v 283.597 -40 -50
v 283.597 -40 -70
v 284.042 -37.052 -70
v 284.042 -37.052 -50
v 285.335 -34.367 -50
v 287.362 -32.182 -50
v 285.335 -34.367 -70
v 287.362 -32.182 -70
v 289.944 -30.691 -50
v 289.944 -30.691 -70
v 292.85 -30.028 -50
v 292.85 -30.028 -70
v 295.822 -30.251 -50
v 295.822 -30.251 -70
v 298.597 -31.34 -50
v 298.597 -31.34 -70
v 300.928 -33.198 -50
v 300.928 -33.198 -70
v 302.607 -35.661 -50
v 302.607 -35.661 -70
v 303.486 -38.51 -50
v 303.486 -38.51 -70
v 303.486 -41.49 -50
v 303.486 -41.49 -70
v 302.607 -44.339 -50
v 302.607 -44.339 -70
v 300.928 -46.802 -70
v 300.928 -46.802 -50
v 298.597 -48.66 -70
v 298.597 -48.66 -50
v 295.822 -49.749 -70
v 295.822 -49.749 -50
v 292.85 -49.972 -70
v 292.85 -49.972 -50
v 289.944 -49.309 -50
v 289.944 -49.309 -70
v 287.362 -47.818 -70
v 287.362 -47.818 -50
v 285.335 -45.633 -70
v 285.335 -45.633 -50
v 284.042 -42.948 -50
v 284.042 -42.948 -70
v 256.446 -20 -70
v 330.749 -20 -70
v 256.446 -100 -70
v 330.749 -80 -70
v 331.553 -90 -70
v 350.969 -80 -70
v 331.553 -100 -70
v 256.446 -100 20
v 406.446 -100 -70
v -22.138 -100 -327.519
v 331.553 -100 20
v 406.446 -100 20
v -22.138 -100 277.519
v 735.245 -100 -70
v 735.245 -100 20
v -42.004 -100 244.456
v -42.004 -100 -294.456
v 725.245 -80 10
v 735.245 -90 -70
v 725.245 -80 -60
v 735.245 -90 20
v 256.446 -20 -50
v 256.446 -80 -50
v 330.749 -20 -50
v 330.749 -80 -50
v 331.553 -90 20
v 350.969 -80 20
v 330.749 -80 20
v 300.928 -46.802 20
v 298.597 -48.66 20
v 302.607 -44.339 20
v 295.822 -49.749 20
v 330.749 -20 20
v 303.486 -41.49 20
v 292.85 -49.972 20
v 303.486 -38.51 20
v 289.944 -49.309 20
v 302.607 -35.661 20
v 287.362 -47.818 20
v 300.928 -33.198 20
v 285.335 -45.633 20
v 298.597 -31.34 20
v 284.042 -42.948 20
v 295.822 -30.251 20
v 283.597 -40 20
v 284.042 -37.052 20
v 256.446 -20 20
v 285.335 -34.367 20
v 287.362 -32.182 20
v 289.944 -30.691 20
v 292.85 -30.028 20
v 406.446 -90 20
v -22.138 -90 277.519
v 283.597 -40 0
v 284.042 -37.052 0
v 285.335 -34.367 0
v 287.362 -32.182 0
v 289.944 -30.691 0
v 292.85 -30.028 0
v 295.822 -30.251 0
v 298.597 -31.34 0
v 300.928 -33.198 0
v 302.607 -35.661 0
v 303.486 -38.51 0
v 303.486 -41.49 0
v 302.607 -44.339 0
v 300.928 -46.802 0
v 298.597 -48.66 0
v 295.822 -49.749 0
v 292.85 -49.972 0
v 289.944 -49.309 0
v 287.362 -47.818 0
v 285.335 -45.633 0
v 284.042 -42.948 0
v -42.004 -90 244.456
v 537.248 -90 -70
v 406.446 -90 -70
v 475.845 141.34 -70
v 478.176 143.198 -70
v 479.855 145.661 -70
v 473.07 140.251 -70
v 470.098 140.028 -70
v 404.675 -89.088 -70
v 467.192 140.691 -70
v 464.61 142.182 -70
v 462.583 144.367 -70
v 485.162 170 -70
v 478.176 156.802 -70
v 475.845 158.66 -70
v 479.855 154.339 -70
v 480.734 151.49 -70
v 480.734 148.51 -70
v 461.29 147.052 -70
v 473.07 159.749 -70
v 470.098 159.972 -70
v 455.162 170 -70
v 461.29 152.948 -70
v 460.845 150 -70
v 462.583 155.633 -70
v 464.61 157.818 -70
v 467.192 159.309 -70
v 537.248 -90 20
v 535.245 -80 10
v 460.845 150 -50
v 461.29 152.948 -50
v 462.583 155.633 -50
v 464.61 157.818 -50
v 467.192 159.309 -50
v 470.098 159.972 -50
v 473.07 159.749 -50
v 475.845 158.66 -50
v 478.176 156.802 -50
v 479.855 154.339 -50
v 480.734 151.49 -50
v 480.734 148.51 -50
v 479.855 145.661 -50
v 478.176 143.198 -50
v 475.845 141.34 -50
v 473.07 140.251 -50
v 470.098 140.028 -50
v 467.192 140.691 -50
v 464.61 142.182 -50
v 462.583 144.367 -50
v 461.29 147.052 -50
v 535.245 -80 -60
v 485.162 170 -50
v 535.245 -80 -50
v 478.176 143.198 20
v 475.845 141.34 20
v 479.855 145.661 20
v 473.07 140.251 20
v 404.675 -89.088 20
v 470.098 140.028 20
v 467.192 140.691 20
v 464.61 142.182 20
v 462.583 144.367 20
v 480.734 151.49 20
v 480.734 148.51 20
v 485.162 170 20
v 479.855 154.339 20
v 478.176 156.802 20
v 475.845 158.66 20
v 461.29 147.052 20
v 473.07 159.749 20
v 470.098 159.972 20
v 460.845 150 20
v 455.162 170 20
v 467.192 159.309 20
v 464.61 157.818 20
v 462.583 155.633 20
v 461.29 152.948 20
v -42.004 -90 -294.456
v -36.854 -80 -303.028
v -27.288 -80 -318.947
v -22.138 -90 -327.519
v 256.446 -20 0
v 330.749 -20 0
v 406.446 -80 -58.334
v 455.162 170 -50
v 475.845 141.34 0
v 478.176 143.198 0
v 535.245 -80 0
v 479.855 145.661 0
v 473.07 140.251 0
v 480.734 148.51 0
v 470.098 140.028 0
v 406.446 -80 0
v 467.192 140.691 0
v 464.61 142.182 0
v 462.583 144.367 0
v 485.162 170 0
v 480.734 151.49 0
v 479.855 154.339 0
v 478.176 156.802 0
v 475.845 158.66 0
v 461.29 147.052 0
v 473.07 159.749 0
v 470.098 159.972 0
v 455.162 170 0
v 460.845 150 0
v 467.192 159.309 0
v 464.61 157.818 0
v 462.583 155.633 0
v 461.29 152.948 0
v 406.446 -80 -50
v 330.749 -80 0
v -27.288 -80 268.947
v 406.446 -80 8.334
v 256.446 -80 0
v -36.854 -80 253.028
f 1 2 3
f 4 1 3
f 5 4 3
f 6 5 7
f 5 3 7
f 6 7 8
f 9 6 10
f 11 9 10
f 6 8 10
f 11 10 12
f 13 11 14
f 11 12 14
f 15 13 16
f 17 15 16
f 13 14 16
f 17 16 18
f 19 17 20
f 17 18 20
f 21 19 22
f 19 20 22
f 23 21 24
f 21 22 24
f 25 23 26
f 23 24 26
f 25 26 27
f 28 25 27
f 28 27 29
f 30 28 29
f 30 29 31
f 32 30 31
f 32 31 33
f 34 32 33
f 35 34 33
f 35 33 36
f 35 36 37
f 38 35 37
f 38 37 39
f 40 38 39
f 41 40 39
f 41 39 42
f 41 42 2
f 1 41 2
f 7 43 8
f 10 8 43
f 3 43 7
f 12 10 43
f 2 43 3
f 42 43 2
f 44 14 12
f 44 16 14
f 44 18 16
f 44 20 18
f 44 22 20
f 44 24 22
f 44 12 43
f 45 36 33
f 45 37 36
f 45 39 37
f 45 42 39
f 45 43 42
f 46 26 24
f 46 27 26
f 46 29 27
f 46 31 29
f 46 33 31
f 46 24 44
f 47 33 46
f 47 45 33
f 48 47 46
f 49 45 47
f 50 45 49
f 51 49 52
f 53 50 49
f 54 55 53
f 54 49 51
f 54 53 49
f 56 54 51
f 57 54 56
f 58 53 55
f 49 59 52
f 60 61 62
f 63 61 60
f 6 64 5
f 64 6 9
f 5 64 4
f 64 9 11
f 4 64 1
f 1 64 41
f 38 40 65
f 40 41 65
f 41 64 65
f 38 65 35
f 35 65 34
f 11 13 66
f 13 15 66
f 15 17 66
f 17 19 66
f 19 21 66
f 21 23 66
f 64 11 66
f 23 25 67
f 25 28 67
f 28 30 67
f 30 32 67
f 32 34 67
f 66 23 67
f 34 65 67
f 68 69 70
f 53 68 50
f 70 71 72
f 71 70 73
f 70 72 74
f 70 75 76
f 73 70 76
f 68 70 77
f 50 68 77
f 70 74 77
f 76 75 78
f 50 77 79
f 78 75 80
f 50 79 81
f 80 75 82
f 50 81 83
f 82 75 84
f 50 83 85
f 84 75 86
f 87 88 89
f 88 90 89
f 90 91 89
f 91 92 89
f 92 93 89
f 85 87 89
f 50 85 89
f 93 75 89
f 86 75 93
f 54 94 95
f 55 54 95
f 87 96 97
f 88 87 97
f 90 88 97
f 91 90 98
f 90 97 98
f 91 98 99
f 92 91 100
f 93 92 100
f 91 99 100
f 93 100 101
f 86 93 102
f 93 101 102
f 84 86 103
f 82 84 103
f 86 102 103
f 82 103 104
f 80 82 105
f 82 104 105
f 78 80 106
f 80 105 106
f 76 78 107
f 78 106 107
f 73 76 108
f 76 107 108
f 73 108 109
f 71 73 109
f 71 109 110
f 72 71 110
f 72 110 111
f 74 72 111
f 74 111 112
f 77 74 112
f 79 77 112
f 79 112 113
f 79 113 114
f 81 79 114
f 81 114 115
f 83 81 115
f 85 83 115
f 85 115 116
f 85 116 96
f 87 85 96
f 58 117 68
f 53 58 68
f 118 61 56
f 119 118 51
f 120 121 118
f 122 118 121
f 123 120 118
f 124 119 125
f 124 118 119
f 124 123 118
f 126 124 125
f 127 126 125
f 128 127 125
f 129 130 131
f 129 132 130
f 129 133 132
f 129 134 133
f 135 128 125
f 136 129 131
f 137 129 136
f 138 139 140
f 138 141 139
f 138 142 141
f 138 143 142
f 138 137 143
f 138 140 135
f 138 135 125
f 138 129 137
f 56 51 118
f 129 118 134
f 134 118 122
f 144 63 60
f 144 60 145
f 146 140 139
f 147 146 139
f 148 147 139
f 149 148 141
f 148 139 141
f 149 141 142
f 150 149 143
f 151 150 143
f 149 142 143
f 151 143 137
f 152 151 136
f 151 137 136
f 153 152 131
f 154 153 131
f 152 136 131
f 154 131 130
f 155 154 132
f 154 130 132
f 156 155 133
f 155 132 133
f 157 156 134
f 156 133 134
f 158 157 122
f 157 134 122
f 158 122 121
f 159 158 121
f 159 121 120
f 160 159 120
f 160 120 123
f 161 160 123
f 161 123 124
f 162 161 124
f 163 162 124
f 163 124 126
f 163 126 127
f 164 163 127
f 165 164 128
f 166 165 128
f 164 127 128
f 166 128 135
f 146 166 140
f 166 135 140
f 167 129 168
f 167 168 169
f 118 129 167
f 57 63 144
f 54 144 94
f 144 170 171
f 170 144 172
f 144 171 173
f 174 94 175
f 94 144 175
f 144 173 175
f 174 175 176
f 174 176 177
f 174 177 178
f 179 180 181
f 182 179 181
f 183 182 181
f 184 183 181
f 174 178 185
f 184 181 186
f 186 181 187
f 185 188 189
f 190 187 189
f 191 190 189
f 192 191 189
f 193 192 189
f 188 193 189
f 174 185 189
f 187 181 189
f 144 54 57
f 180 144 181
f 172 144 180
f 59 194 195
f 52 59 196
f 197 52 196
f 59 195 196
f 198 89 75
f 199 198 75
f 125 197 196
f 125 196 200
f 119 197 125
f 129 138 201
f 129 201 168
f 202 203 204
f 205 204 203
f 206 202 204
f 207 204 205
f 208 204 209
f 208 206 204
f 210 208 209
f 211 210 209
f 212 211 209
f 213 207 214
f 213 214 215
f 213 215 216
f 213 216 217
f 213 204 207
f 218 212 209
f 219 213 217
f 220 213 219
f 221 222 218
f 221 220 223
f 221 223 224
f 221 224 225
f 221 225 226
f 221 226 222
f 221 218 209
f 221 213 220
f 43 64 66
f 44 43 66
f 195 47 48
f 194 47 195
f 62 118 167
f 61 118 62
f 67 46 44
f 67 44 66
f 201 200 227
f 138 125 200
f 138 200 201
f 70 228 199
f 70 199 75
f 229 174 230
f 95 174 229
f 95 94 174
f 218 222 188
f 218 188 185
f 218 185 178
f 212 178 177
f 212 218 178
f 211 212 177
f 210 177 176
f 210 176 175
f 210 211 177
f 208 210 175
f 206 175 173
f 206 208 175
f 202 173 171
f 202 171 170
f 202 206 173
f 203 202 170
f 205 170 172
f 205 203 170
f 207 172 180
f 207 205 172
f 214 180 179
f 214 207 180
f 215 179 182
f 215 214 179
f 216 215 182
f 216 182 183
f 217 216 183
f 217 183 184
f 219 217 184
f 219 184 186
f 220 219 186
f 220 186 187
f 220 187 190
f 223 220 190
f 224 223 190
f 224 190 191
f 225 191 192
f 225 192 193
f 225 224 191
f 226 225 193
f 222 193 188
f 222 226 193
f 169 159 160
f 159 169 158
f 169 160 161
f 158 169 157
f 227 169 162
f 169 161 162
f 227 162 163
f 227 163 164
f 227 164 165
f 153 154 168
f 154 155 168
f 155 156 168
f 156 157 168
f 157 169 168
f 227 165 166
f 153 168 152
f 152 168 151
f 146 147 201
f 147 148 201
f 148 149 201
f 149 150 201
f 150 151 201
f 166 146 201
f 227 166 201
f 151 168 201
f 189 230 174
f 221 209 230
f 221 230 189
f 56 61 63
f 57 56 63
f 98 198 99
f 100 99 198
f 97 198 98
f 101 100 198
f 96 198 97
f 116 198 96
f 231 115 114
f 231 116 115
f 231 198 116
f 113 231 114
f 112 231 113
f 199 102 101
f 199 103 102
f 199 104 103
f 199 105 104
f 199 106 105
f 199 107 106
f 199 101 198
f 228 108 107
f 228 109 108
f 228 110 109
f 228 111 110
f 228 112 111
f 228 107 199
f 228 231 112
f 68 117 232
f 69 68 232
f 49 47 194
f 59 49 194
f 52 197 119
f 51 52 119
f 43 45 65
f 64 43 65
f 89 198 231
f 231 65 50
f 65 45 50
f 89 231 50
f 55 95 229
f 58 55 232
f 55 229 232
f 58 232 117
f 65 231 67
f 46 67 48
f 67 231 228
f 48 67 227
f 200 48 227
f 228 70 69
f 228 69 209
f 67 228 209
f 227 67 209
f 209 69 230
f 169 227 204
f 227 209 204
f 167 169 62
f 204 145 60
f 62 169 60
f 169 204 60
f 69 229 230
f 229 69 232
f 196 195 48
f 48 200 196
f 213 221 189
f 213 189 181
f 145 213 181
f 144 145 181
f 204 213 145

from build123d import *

# Parameters (mm, degrees)
ESQUISSE1_R             = 10
BOSS_EXTRU_1_DEPTH      = 20
BOSS_EXTRU_2_DEPTH      = 20
ESQUISSE3_R             = 10
BOSS_EXTRU_3_DEPTH      = 20
CHANFREIN3_SIZE         = 10
ESQUISSE2_5_W           = 74.303027804
ESQUISSE2_5_H           = 20
BOSS_EXTRU_4_DEPTH      = 60
ESQUISSE4_R             = 10
ENL_V_MAT_EXTRU_1_DEPTH = 831.815461604
CHANFREIN2_SIZE         = 10


with BuildPart() as part:
    # Esquisse1 → Boss.-Extru.1 (new body)
    with BuildSketch(Plane.XY):
        Polygon((455.162466111, 170), (485.162466111, 170), (535.244755063, -80), (406.445725989, -80), align=None)
        with Locations((470.845240526, 150)):
            Circle(ESQUISSE1_R, mode=Mode.SUBTRACT)
    extrude(amount=BOSS_EXTRU_1_DEPTH)

    # Esquisse2 → Boss.-Extru.2 (add)
    with BuildSketch(Plane.XZ.offset(80)):
        Polygon((735.244755063, 20), (406.445725989, 20), (-22.137924362, 277.519037455), (-42.004245202, 244.455927292), (331.553149283, 20), (256.445725989, 20), (256.445725989, -70), (331.553149283, -70), (-42.004245202, -294.455927292), (-22.137924362, -327.519037455), (406.445725989, -70), (735.244755063, -70), align=None)
    extrude(amount=BOSS_EXTRU_2_DEPTH)

    # Esquisse3 → Boss.-Extru.3 (add)
    with BuildSketch(Plane(origin=(0, 0, -70), x_dir=(-1, 0, 0), z_dir=(0, 0, -1))):
        Polygon((-406.445725989, -80), (-455.162466111, 170), (-485.162466111, 170), (-535.244755063, -80), align=None)
        with Locations((-470.845240526, 150)):
            Circle(ESQUISSE3_R, mode=Mode.SUBTRACT)
    extrude(amount=-BOSS_EXTRU_3_DEPTH)

    # Chanfrein3
    chanfrein3_edges = [part.edges().sort_by_distance(p)[0] for p in [
        (144.774452041, -80, 132.227963646),
        (144.774452041, -80, -182.227963646),
        (192.153900813, -80, 148.759518728),
        (192.153900813, -80, -198.759518728),
    ]]
    chamfer(chanfrein3_edges, length=CHANFREIN3_SIZE)

    # Esquisse2<5> → Boss.-Extru.4 (add)
    with BuildSketch(Plane.XZ.offset(80)):
        with Locations((293.597239891, 10)):
            Rectangle(ESQUISSE2_5_W, ESQUISSE2_5_H)
        with Locations((293.597239891, -60)):
            Rectangle(ESQUISSE2_5_W, ESQUISSE2_5_H)
    extrude(amount=-BOSS_EXTRU_4_DEPTH)

    # Esquisse4 → Enlèv. mat.-Extru.1 (cut, through all)
    with BuildSketch(Plane(origin=(0, 0, -70), x_dir=(-1, 0, 0), z_dir=(0, 0, -1))):
        with Locations((-293.597239891, -40)):
            Circle(ESQUISSE4_R)
    extrude(amount=-ENL_V_MAT_EXTRU_1_DEPTH, mode=Mode.SUBTRACT)

    # Chanfrein2
    chanfrein2_edges = [part.edges().sort_by_distance(p)[0] for p in [
        (635.244755063, -80, -70),
        (635.244755063, -80, 20),
        (735.244755063, -80, -25),
    ]]
    chamfer(chanfrein2_edges, length=CHANFREIN2_SIZE)


solid = part.part
